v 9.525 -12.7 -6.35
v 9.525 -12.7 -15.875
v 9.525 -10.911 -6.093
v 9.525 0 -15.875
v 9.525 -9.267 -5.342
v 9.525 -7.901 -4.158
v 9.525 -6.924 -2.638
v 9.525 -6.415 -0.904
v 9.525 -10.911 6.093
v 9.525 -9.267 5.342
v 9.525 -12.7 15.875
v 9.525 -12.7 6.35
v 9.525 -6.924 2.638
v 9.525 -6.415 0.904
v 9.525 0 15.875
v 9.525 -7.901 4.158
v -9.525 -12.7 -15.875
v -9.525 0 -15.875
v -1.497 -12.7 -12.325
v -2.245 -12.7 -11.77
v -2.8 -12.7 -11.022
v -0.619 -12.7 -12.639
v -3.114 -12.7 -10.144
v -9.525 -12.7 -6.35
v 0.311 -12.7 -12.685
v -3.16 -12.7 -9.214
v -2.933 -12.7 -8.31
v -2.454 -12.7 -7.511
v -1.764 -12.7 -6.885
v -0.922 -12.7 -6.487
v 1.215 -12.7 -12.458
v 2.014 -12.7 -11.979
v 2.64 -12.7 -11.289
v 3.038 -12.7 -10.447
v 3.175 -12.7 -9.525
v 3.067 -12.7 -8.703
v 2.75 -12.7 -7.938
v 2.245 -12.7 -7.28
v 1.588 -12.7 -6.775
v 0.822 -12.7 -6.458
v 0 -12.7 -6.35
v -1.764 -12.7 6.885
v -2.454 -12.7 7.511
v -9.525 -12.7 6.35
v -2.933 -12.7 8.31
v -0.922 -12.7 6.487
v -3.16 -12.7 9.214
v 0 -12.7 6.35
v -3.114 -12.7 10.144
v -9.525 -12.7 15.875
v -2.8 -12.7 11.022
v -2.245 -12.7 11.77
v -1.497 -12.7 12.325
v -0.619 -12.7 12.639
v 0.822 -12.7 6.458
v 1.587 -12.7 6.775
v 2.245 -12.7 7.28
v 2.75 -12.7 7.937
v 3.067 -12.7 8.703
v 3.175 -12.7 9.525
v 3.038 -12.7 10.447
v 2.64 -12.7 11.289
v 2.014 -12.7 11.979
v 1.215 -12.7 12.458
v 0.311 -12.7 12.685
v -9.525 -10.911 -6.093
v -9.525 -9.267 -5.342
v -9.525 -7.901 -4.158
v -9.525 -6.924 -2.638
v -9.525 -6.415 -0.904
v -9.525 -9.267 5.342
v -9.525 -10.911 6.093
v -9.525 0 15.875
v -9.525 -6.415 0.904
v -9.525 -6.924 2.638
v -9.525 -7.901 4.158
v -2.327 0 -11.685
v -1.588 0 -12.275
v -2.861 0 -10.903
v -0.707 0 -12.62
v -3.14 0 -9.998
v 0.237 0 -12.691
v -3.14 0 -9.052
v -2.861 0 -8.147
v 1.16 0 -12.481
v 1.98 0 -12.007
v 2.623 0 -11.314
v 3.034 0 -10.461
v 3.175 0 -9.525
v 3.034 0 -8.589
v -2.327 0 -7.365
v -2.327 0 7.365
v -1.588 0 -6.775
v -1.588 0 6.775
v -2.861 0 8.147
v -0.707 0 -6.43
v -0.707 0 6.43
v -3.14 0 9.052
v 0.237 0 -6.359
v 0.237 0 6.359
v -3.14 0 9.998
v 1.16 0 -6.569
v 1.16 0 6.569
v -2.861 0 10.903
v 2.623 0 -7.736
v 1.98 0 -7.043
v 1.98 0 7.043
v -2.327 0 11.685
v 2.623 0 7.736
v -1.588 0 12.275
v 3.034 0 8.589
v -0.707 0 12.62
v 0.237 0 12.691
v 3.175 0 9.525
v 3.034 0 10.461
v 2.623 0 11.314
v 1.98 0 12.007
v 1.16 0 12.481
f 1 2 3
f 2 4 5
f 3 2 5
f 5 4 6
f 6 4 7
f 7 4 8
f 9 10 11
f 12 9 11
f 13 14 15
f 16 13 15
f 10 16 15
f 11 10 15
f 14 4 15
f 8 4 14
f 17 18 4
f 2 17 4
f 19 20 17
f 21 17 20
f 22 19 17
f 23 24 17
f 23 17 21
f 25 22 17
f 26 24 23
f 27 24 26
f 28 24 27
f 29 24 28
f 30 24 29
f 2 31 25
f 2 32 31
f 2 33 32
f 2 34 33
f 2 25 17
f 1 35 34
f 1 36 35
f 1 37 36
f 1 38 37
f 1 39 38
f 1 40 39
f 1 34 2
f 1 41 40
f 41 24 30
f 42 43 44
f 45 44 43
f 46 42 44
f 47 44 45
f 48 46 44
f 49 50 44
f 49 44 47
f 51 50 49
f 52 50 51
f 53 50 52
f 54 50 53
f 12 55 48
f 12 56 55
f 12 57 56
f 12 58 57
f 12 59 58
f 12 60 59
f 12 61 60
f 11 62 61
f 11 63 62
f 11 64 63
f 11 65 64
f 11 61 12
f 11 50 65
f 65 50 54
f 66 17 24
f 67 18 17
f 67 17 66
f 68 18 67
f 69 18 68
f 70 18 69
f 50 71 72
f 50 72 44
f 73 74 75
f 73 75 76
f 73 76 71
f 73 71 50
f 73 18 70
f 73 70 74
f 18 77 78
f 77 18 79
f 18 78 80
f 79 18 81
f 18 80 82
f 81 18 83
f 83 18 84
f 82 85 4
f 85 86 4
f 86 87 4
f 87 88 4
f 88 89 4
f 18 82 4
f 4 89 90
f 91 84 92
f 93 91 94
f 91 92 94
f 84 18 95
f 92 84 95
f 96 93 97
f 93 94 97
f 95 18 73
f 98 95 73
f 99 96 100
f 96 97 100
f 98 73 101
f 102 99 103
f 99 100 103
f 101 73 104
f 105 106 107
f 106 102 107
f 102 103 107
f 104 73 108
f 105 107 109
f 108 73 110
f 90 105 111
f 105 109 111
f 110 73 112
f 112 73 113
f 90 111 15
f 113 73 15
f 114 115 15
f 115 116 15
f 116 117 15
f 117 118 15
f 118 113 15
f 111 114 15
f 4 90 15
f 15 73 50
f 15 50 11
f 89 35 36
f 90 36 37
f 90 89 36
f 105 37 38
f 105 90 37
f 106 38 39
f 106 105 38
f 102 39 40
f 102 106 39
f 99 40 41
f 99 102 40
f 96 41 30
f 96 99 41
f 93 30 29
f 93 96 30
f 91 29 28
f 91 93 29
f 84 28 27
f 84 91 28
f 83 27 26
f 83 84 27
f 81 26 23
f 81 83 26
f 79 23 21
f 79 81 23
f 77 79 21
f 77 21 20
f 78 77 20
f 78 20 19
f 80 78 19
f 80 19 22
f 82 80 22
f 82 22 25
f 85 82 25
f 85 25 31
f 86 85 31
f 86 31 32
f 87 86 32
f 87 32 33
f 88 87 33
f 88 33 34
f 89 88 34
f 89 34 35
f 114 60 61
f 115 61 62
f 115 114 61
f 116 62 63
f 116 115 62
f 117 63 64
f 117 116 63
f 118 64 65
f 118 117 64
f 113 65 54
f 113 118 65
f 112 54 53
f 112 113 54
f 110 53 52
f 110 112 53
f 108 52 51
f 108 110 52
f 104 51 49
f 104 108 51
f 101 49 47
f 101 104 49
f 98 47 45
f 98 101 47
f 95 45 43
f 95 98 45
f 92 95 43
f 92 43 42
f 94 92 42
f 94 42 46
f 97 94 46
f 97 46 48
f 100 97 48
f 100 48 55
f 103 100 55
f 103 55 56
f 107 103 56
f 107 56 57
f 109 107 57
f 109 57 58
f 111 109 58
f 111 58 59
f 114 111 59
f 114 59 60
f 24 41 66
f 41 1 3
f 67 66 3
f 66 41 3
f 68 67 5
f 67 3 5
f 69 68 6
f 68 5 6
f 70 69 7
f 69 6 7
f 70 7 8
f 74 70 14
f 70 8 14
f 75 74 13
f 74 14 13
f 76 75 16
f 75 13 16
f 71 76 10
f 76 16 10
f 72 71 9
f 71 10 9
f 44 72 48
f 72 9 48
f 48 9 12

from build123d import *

# Parameters (mm, degrees)
F0_W     = 19.05
F0_H     = 31.75
F0_R     = 3.175
F1_DEPTH = 12.7
F2_R     = 6.35
F3_DEPTH = 19.051


with BuildPart() as f1:
    # F0 (on Front) → F1 (new body)
    with BuildSketch(Plane.XZ):
        Rectangle(F0_W, F0_H)
        with Locations((0, -9.525)):
            Circle(F0_R, mode=Mode.SUBTRACT)
        with Locations((0, 9.525)):
            Circle(F0_R, mode=Mode.SUBTRACT)
    extrude(amount=F1_DEPTH)

    # F2 (on face) → F3 (cut, through all)
    with BuildSketch(Plane.YZ.offset(9.525)):
        with Locations((-12.7, 0)):
            Circle(F2_R)
    extrude(amount=-F3_DEPTH, mode=Mode.SUBTRACT)


solid = f1.part
